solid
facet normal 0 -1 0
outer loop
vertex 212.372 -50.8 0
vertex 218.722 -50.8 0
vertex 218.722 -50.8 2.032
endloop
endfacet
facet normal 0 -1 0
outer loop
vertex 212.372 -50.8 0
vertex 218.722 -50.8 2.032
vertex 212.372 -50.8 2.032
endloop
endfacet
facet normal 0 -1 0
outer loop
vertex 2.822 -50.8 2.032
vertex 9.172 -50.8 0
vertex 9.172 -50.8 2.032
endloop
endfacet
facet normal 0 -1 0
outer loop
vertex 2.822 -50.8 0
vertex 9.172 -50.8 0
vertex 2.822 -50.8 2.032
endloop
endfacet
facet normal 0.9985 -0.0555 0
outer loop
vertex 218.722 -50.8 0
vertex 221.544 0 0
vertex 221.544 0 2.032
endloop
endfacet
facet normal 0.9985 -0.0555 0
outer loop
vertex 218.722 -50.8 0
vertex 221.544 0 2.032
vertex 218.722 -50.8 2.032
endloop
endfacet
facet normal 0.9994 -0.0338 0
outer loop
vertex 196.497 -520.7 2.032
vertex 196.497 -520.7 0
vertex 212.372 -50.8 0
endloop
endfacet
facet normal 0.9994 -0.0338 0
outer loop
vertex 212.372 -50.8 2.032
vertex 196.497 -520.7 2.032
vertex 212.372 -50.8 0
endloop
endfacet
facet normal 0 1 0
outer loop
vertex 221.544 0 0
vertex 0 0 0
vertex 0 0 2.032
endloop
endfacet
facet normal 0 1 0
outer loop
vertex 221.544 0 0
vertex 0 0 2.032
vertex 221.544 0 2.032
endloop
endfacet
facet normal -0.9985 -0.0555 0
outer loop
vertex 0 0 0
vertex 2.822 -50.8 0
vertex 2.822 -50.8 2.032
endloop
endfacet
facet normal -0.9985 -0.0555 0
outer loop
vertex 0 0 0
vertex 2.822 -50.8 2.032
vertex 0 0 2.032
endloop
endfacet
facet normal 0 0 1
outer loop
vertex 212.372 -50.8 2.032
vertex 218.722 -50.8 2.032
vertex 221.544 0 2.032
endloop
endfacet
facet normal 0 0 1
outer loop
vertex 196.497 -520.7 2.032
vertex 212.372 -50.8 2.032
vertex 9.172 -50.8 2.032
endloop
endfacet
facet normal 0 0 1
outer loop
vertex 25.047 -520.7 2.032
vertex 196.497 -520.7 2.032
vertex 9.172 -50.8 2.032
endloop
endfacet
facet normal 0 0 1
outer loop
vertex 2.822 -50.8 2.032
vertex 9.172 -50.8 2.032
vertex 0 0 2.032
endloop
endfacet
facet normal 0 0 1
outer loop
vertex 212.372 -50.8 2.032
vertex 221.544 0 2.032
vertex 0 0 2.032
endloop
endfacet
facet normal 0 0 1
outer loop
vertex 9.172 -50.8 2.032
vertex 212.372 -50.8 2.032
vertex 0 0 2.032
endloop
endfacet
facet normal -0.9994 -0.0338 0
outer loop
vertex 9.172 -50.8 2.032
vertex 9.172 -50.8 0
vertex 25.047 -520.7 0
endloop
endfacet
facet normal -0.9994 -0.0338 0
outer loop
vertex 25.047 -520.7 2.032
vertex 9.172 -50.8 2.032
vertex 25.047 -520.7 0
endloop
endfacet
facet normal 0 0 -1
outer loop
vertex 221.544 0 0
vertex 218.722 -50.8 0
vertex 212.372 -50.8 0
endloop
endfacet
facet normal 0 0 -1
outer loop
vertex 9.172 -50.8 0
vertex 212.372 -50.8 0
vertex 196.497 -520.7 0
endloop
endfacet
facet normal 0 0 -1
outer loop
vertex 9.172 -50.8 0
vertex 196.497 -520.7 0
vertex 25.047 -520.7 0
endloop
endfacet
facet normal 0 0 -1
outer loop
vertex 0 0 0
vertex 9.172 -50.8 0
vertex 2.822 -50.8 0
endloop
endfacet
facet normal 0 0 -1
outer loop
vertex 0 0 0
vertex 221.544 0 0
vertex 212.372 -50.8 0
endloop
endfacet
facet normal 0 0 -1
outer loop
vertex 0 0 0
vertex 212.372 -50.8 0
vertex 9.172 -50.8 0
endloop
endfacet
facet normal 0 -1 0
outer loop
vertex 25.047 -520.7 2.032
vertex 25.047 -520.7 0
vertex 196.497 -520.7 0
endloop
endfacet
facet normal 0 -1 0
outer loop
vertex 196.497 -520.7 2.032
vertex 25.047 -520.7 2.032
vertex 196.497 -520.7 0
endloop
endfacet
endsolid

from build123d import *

# Parameters (mm, degrees)
BOSS_EXTRUDE1_DEPTH = 2.032


with BuildPart() as part:
    # Sketch1 → Boss-Extrude1 (new body)
    with BuildSketch(Plane.XY):
        Polygon((221.544444444, 0), (218.722222222, -50.8), (2.822222222, -50.8), (0, 0), align=None)
        Polygon((212.372222222, -50.8), (9.172222222, -50.8), (25.047222222, -520.7), (196.497222222, -520.7), align=None)
    extrude(amount=BOSS_EXTRUDE1_DEPTH)


solid = part.part
